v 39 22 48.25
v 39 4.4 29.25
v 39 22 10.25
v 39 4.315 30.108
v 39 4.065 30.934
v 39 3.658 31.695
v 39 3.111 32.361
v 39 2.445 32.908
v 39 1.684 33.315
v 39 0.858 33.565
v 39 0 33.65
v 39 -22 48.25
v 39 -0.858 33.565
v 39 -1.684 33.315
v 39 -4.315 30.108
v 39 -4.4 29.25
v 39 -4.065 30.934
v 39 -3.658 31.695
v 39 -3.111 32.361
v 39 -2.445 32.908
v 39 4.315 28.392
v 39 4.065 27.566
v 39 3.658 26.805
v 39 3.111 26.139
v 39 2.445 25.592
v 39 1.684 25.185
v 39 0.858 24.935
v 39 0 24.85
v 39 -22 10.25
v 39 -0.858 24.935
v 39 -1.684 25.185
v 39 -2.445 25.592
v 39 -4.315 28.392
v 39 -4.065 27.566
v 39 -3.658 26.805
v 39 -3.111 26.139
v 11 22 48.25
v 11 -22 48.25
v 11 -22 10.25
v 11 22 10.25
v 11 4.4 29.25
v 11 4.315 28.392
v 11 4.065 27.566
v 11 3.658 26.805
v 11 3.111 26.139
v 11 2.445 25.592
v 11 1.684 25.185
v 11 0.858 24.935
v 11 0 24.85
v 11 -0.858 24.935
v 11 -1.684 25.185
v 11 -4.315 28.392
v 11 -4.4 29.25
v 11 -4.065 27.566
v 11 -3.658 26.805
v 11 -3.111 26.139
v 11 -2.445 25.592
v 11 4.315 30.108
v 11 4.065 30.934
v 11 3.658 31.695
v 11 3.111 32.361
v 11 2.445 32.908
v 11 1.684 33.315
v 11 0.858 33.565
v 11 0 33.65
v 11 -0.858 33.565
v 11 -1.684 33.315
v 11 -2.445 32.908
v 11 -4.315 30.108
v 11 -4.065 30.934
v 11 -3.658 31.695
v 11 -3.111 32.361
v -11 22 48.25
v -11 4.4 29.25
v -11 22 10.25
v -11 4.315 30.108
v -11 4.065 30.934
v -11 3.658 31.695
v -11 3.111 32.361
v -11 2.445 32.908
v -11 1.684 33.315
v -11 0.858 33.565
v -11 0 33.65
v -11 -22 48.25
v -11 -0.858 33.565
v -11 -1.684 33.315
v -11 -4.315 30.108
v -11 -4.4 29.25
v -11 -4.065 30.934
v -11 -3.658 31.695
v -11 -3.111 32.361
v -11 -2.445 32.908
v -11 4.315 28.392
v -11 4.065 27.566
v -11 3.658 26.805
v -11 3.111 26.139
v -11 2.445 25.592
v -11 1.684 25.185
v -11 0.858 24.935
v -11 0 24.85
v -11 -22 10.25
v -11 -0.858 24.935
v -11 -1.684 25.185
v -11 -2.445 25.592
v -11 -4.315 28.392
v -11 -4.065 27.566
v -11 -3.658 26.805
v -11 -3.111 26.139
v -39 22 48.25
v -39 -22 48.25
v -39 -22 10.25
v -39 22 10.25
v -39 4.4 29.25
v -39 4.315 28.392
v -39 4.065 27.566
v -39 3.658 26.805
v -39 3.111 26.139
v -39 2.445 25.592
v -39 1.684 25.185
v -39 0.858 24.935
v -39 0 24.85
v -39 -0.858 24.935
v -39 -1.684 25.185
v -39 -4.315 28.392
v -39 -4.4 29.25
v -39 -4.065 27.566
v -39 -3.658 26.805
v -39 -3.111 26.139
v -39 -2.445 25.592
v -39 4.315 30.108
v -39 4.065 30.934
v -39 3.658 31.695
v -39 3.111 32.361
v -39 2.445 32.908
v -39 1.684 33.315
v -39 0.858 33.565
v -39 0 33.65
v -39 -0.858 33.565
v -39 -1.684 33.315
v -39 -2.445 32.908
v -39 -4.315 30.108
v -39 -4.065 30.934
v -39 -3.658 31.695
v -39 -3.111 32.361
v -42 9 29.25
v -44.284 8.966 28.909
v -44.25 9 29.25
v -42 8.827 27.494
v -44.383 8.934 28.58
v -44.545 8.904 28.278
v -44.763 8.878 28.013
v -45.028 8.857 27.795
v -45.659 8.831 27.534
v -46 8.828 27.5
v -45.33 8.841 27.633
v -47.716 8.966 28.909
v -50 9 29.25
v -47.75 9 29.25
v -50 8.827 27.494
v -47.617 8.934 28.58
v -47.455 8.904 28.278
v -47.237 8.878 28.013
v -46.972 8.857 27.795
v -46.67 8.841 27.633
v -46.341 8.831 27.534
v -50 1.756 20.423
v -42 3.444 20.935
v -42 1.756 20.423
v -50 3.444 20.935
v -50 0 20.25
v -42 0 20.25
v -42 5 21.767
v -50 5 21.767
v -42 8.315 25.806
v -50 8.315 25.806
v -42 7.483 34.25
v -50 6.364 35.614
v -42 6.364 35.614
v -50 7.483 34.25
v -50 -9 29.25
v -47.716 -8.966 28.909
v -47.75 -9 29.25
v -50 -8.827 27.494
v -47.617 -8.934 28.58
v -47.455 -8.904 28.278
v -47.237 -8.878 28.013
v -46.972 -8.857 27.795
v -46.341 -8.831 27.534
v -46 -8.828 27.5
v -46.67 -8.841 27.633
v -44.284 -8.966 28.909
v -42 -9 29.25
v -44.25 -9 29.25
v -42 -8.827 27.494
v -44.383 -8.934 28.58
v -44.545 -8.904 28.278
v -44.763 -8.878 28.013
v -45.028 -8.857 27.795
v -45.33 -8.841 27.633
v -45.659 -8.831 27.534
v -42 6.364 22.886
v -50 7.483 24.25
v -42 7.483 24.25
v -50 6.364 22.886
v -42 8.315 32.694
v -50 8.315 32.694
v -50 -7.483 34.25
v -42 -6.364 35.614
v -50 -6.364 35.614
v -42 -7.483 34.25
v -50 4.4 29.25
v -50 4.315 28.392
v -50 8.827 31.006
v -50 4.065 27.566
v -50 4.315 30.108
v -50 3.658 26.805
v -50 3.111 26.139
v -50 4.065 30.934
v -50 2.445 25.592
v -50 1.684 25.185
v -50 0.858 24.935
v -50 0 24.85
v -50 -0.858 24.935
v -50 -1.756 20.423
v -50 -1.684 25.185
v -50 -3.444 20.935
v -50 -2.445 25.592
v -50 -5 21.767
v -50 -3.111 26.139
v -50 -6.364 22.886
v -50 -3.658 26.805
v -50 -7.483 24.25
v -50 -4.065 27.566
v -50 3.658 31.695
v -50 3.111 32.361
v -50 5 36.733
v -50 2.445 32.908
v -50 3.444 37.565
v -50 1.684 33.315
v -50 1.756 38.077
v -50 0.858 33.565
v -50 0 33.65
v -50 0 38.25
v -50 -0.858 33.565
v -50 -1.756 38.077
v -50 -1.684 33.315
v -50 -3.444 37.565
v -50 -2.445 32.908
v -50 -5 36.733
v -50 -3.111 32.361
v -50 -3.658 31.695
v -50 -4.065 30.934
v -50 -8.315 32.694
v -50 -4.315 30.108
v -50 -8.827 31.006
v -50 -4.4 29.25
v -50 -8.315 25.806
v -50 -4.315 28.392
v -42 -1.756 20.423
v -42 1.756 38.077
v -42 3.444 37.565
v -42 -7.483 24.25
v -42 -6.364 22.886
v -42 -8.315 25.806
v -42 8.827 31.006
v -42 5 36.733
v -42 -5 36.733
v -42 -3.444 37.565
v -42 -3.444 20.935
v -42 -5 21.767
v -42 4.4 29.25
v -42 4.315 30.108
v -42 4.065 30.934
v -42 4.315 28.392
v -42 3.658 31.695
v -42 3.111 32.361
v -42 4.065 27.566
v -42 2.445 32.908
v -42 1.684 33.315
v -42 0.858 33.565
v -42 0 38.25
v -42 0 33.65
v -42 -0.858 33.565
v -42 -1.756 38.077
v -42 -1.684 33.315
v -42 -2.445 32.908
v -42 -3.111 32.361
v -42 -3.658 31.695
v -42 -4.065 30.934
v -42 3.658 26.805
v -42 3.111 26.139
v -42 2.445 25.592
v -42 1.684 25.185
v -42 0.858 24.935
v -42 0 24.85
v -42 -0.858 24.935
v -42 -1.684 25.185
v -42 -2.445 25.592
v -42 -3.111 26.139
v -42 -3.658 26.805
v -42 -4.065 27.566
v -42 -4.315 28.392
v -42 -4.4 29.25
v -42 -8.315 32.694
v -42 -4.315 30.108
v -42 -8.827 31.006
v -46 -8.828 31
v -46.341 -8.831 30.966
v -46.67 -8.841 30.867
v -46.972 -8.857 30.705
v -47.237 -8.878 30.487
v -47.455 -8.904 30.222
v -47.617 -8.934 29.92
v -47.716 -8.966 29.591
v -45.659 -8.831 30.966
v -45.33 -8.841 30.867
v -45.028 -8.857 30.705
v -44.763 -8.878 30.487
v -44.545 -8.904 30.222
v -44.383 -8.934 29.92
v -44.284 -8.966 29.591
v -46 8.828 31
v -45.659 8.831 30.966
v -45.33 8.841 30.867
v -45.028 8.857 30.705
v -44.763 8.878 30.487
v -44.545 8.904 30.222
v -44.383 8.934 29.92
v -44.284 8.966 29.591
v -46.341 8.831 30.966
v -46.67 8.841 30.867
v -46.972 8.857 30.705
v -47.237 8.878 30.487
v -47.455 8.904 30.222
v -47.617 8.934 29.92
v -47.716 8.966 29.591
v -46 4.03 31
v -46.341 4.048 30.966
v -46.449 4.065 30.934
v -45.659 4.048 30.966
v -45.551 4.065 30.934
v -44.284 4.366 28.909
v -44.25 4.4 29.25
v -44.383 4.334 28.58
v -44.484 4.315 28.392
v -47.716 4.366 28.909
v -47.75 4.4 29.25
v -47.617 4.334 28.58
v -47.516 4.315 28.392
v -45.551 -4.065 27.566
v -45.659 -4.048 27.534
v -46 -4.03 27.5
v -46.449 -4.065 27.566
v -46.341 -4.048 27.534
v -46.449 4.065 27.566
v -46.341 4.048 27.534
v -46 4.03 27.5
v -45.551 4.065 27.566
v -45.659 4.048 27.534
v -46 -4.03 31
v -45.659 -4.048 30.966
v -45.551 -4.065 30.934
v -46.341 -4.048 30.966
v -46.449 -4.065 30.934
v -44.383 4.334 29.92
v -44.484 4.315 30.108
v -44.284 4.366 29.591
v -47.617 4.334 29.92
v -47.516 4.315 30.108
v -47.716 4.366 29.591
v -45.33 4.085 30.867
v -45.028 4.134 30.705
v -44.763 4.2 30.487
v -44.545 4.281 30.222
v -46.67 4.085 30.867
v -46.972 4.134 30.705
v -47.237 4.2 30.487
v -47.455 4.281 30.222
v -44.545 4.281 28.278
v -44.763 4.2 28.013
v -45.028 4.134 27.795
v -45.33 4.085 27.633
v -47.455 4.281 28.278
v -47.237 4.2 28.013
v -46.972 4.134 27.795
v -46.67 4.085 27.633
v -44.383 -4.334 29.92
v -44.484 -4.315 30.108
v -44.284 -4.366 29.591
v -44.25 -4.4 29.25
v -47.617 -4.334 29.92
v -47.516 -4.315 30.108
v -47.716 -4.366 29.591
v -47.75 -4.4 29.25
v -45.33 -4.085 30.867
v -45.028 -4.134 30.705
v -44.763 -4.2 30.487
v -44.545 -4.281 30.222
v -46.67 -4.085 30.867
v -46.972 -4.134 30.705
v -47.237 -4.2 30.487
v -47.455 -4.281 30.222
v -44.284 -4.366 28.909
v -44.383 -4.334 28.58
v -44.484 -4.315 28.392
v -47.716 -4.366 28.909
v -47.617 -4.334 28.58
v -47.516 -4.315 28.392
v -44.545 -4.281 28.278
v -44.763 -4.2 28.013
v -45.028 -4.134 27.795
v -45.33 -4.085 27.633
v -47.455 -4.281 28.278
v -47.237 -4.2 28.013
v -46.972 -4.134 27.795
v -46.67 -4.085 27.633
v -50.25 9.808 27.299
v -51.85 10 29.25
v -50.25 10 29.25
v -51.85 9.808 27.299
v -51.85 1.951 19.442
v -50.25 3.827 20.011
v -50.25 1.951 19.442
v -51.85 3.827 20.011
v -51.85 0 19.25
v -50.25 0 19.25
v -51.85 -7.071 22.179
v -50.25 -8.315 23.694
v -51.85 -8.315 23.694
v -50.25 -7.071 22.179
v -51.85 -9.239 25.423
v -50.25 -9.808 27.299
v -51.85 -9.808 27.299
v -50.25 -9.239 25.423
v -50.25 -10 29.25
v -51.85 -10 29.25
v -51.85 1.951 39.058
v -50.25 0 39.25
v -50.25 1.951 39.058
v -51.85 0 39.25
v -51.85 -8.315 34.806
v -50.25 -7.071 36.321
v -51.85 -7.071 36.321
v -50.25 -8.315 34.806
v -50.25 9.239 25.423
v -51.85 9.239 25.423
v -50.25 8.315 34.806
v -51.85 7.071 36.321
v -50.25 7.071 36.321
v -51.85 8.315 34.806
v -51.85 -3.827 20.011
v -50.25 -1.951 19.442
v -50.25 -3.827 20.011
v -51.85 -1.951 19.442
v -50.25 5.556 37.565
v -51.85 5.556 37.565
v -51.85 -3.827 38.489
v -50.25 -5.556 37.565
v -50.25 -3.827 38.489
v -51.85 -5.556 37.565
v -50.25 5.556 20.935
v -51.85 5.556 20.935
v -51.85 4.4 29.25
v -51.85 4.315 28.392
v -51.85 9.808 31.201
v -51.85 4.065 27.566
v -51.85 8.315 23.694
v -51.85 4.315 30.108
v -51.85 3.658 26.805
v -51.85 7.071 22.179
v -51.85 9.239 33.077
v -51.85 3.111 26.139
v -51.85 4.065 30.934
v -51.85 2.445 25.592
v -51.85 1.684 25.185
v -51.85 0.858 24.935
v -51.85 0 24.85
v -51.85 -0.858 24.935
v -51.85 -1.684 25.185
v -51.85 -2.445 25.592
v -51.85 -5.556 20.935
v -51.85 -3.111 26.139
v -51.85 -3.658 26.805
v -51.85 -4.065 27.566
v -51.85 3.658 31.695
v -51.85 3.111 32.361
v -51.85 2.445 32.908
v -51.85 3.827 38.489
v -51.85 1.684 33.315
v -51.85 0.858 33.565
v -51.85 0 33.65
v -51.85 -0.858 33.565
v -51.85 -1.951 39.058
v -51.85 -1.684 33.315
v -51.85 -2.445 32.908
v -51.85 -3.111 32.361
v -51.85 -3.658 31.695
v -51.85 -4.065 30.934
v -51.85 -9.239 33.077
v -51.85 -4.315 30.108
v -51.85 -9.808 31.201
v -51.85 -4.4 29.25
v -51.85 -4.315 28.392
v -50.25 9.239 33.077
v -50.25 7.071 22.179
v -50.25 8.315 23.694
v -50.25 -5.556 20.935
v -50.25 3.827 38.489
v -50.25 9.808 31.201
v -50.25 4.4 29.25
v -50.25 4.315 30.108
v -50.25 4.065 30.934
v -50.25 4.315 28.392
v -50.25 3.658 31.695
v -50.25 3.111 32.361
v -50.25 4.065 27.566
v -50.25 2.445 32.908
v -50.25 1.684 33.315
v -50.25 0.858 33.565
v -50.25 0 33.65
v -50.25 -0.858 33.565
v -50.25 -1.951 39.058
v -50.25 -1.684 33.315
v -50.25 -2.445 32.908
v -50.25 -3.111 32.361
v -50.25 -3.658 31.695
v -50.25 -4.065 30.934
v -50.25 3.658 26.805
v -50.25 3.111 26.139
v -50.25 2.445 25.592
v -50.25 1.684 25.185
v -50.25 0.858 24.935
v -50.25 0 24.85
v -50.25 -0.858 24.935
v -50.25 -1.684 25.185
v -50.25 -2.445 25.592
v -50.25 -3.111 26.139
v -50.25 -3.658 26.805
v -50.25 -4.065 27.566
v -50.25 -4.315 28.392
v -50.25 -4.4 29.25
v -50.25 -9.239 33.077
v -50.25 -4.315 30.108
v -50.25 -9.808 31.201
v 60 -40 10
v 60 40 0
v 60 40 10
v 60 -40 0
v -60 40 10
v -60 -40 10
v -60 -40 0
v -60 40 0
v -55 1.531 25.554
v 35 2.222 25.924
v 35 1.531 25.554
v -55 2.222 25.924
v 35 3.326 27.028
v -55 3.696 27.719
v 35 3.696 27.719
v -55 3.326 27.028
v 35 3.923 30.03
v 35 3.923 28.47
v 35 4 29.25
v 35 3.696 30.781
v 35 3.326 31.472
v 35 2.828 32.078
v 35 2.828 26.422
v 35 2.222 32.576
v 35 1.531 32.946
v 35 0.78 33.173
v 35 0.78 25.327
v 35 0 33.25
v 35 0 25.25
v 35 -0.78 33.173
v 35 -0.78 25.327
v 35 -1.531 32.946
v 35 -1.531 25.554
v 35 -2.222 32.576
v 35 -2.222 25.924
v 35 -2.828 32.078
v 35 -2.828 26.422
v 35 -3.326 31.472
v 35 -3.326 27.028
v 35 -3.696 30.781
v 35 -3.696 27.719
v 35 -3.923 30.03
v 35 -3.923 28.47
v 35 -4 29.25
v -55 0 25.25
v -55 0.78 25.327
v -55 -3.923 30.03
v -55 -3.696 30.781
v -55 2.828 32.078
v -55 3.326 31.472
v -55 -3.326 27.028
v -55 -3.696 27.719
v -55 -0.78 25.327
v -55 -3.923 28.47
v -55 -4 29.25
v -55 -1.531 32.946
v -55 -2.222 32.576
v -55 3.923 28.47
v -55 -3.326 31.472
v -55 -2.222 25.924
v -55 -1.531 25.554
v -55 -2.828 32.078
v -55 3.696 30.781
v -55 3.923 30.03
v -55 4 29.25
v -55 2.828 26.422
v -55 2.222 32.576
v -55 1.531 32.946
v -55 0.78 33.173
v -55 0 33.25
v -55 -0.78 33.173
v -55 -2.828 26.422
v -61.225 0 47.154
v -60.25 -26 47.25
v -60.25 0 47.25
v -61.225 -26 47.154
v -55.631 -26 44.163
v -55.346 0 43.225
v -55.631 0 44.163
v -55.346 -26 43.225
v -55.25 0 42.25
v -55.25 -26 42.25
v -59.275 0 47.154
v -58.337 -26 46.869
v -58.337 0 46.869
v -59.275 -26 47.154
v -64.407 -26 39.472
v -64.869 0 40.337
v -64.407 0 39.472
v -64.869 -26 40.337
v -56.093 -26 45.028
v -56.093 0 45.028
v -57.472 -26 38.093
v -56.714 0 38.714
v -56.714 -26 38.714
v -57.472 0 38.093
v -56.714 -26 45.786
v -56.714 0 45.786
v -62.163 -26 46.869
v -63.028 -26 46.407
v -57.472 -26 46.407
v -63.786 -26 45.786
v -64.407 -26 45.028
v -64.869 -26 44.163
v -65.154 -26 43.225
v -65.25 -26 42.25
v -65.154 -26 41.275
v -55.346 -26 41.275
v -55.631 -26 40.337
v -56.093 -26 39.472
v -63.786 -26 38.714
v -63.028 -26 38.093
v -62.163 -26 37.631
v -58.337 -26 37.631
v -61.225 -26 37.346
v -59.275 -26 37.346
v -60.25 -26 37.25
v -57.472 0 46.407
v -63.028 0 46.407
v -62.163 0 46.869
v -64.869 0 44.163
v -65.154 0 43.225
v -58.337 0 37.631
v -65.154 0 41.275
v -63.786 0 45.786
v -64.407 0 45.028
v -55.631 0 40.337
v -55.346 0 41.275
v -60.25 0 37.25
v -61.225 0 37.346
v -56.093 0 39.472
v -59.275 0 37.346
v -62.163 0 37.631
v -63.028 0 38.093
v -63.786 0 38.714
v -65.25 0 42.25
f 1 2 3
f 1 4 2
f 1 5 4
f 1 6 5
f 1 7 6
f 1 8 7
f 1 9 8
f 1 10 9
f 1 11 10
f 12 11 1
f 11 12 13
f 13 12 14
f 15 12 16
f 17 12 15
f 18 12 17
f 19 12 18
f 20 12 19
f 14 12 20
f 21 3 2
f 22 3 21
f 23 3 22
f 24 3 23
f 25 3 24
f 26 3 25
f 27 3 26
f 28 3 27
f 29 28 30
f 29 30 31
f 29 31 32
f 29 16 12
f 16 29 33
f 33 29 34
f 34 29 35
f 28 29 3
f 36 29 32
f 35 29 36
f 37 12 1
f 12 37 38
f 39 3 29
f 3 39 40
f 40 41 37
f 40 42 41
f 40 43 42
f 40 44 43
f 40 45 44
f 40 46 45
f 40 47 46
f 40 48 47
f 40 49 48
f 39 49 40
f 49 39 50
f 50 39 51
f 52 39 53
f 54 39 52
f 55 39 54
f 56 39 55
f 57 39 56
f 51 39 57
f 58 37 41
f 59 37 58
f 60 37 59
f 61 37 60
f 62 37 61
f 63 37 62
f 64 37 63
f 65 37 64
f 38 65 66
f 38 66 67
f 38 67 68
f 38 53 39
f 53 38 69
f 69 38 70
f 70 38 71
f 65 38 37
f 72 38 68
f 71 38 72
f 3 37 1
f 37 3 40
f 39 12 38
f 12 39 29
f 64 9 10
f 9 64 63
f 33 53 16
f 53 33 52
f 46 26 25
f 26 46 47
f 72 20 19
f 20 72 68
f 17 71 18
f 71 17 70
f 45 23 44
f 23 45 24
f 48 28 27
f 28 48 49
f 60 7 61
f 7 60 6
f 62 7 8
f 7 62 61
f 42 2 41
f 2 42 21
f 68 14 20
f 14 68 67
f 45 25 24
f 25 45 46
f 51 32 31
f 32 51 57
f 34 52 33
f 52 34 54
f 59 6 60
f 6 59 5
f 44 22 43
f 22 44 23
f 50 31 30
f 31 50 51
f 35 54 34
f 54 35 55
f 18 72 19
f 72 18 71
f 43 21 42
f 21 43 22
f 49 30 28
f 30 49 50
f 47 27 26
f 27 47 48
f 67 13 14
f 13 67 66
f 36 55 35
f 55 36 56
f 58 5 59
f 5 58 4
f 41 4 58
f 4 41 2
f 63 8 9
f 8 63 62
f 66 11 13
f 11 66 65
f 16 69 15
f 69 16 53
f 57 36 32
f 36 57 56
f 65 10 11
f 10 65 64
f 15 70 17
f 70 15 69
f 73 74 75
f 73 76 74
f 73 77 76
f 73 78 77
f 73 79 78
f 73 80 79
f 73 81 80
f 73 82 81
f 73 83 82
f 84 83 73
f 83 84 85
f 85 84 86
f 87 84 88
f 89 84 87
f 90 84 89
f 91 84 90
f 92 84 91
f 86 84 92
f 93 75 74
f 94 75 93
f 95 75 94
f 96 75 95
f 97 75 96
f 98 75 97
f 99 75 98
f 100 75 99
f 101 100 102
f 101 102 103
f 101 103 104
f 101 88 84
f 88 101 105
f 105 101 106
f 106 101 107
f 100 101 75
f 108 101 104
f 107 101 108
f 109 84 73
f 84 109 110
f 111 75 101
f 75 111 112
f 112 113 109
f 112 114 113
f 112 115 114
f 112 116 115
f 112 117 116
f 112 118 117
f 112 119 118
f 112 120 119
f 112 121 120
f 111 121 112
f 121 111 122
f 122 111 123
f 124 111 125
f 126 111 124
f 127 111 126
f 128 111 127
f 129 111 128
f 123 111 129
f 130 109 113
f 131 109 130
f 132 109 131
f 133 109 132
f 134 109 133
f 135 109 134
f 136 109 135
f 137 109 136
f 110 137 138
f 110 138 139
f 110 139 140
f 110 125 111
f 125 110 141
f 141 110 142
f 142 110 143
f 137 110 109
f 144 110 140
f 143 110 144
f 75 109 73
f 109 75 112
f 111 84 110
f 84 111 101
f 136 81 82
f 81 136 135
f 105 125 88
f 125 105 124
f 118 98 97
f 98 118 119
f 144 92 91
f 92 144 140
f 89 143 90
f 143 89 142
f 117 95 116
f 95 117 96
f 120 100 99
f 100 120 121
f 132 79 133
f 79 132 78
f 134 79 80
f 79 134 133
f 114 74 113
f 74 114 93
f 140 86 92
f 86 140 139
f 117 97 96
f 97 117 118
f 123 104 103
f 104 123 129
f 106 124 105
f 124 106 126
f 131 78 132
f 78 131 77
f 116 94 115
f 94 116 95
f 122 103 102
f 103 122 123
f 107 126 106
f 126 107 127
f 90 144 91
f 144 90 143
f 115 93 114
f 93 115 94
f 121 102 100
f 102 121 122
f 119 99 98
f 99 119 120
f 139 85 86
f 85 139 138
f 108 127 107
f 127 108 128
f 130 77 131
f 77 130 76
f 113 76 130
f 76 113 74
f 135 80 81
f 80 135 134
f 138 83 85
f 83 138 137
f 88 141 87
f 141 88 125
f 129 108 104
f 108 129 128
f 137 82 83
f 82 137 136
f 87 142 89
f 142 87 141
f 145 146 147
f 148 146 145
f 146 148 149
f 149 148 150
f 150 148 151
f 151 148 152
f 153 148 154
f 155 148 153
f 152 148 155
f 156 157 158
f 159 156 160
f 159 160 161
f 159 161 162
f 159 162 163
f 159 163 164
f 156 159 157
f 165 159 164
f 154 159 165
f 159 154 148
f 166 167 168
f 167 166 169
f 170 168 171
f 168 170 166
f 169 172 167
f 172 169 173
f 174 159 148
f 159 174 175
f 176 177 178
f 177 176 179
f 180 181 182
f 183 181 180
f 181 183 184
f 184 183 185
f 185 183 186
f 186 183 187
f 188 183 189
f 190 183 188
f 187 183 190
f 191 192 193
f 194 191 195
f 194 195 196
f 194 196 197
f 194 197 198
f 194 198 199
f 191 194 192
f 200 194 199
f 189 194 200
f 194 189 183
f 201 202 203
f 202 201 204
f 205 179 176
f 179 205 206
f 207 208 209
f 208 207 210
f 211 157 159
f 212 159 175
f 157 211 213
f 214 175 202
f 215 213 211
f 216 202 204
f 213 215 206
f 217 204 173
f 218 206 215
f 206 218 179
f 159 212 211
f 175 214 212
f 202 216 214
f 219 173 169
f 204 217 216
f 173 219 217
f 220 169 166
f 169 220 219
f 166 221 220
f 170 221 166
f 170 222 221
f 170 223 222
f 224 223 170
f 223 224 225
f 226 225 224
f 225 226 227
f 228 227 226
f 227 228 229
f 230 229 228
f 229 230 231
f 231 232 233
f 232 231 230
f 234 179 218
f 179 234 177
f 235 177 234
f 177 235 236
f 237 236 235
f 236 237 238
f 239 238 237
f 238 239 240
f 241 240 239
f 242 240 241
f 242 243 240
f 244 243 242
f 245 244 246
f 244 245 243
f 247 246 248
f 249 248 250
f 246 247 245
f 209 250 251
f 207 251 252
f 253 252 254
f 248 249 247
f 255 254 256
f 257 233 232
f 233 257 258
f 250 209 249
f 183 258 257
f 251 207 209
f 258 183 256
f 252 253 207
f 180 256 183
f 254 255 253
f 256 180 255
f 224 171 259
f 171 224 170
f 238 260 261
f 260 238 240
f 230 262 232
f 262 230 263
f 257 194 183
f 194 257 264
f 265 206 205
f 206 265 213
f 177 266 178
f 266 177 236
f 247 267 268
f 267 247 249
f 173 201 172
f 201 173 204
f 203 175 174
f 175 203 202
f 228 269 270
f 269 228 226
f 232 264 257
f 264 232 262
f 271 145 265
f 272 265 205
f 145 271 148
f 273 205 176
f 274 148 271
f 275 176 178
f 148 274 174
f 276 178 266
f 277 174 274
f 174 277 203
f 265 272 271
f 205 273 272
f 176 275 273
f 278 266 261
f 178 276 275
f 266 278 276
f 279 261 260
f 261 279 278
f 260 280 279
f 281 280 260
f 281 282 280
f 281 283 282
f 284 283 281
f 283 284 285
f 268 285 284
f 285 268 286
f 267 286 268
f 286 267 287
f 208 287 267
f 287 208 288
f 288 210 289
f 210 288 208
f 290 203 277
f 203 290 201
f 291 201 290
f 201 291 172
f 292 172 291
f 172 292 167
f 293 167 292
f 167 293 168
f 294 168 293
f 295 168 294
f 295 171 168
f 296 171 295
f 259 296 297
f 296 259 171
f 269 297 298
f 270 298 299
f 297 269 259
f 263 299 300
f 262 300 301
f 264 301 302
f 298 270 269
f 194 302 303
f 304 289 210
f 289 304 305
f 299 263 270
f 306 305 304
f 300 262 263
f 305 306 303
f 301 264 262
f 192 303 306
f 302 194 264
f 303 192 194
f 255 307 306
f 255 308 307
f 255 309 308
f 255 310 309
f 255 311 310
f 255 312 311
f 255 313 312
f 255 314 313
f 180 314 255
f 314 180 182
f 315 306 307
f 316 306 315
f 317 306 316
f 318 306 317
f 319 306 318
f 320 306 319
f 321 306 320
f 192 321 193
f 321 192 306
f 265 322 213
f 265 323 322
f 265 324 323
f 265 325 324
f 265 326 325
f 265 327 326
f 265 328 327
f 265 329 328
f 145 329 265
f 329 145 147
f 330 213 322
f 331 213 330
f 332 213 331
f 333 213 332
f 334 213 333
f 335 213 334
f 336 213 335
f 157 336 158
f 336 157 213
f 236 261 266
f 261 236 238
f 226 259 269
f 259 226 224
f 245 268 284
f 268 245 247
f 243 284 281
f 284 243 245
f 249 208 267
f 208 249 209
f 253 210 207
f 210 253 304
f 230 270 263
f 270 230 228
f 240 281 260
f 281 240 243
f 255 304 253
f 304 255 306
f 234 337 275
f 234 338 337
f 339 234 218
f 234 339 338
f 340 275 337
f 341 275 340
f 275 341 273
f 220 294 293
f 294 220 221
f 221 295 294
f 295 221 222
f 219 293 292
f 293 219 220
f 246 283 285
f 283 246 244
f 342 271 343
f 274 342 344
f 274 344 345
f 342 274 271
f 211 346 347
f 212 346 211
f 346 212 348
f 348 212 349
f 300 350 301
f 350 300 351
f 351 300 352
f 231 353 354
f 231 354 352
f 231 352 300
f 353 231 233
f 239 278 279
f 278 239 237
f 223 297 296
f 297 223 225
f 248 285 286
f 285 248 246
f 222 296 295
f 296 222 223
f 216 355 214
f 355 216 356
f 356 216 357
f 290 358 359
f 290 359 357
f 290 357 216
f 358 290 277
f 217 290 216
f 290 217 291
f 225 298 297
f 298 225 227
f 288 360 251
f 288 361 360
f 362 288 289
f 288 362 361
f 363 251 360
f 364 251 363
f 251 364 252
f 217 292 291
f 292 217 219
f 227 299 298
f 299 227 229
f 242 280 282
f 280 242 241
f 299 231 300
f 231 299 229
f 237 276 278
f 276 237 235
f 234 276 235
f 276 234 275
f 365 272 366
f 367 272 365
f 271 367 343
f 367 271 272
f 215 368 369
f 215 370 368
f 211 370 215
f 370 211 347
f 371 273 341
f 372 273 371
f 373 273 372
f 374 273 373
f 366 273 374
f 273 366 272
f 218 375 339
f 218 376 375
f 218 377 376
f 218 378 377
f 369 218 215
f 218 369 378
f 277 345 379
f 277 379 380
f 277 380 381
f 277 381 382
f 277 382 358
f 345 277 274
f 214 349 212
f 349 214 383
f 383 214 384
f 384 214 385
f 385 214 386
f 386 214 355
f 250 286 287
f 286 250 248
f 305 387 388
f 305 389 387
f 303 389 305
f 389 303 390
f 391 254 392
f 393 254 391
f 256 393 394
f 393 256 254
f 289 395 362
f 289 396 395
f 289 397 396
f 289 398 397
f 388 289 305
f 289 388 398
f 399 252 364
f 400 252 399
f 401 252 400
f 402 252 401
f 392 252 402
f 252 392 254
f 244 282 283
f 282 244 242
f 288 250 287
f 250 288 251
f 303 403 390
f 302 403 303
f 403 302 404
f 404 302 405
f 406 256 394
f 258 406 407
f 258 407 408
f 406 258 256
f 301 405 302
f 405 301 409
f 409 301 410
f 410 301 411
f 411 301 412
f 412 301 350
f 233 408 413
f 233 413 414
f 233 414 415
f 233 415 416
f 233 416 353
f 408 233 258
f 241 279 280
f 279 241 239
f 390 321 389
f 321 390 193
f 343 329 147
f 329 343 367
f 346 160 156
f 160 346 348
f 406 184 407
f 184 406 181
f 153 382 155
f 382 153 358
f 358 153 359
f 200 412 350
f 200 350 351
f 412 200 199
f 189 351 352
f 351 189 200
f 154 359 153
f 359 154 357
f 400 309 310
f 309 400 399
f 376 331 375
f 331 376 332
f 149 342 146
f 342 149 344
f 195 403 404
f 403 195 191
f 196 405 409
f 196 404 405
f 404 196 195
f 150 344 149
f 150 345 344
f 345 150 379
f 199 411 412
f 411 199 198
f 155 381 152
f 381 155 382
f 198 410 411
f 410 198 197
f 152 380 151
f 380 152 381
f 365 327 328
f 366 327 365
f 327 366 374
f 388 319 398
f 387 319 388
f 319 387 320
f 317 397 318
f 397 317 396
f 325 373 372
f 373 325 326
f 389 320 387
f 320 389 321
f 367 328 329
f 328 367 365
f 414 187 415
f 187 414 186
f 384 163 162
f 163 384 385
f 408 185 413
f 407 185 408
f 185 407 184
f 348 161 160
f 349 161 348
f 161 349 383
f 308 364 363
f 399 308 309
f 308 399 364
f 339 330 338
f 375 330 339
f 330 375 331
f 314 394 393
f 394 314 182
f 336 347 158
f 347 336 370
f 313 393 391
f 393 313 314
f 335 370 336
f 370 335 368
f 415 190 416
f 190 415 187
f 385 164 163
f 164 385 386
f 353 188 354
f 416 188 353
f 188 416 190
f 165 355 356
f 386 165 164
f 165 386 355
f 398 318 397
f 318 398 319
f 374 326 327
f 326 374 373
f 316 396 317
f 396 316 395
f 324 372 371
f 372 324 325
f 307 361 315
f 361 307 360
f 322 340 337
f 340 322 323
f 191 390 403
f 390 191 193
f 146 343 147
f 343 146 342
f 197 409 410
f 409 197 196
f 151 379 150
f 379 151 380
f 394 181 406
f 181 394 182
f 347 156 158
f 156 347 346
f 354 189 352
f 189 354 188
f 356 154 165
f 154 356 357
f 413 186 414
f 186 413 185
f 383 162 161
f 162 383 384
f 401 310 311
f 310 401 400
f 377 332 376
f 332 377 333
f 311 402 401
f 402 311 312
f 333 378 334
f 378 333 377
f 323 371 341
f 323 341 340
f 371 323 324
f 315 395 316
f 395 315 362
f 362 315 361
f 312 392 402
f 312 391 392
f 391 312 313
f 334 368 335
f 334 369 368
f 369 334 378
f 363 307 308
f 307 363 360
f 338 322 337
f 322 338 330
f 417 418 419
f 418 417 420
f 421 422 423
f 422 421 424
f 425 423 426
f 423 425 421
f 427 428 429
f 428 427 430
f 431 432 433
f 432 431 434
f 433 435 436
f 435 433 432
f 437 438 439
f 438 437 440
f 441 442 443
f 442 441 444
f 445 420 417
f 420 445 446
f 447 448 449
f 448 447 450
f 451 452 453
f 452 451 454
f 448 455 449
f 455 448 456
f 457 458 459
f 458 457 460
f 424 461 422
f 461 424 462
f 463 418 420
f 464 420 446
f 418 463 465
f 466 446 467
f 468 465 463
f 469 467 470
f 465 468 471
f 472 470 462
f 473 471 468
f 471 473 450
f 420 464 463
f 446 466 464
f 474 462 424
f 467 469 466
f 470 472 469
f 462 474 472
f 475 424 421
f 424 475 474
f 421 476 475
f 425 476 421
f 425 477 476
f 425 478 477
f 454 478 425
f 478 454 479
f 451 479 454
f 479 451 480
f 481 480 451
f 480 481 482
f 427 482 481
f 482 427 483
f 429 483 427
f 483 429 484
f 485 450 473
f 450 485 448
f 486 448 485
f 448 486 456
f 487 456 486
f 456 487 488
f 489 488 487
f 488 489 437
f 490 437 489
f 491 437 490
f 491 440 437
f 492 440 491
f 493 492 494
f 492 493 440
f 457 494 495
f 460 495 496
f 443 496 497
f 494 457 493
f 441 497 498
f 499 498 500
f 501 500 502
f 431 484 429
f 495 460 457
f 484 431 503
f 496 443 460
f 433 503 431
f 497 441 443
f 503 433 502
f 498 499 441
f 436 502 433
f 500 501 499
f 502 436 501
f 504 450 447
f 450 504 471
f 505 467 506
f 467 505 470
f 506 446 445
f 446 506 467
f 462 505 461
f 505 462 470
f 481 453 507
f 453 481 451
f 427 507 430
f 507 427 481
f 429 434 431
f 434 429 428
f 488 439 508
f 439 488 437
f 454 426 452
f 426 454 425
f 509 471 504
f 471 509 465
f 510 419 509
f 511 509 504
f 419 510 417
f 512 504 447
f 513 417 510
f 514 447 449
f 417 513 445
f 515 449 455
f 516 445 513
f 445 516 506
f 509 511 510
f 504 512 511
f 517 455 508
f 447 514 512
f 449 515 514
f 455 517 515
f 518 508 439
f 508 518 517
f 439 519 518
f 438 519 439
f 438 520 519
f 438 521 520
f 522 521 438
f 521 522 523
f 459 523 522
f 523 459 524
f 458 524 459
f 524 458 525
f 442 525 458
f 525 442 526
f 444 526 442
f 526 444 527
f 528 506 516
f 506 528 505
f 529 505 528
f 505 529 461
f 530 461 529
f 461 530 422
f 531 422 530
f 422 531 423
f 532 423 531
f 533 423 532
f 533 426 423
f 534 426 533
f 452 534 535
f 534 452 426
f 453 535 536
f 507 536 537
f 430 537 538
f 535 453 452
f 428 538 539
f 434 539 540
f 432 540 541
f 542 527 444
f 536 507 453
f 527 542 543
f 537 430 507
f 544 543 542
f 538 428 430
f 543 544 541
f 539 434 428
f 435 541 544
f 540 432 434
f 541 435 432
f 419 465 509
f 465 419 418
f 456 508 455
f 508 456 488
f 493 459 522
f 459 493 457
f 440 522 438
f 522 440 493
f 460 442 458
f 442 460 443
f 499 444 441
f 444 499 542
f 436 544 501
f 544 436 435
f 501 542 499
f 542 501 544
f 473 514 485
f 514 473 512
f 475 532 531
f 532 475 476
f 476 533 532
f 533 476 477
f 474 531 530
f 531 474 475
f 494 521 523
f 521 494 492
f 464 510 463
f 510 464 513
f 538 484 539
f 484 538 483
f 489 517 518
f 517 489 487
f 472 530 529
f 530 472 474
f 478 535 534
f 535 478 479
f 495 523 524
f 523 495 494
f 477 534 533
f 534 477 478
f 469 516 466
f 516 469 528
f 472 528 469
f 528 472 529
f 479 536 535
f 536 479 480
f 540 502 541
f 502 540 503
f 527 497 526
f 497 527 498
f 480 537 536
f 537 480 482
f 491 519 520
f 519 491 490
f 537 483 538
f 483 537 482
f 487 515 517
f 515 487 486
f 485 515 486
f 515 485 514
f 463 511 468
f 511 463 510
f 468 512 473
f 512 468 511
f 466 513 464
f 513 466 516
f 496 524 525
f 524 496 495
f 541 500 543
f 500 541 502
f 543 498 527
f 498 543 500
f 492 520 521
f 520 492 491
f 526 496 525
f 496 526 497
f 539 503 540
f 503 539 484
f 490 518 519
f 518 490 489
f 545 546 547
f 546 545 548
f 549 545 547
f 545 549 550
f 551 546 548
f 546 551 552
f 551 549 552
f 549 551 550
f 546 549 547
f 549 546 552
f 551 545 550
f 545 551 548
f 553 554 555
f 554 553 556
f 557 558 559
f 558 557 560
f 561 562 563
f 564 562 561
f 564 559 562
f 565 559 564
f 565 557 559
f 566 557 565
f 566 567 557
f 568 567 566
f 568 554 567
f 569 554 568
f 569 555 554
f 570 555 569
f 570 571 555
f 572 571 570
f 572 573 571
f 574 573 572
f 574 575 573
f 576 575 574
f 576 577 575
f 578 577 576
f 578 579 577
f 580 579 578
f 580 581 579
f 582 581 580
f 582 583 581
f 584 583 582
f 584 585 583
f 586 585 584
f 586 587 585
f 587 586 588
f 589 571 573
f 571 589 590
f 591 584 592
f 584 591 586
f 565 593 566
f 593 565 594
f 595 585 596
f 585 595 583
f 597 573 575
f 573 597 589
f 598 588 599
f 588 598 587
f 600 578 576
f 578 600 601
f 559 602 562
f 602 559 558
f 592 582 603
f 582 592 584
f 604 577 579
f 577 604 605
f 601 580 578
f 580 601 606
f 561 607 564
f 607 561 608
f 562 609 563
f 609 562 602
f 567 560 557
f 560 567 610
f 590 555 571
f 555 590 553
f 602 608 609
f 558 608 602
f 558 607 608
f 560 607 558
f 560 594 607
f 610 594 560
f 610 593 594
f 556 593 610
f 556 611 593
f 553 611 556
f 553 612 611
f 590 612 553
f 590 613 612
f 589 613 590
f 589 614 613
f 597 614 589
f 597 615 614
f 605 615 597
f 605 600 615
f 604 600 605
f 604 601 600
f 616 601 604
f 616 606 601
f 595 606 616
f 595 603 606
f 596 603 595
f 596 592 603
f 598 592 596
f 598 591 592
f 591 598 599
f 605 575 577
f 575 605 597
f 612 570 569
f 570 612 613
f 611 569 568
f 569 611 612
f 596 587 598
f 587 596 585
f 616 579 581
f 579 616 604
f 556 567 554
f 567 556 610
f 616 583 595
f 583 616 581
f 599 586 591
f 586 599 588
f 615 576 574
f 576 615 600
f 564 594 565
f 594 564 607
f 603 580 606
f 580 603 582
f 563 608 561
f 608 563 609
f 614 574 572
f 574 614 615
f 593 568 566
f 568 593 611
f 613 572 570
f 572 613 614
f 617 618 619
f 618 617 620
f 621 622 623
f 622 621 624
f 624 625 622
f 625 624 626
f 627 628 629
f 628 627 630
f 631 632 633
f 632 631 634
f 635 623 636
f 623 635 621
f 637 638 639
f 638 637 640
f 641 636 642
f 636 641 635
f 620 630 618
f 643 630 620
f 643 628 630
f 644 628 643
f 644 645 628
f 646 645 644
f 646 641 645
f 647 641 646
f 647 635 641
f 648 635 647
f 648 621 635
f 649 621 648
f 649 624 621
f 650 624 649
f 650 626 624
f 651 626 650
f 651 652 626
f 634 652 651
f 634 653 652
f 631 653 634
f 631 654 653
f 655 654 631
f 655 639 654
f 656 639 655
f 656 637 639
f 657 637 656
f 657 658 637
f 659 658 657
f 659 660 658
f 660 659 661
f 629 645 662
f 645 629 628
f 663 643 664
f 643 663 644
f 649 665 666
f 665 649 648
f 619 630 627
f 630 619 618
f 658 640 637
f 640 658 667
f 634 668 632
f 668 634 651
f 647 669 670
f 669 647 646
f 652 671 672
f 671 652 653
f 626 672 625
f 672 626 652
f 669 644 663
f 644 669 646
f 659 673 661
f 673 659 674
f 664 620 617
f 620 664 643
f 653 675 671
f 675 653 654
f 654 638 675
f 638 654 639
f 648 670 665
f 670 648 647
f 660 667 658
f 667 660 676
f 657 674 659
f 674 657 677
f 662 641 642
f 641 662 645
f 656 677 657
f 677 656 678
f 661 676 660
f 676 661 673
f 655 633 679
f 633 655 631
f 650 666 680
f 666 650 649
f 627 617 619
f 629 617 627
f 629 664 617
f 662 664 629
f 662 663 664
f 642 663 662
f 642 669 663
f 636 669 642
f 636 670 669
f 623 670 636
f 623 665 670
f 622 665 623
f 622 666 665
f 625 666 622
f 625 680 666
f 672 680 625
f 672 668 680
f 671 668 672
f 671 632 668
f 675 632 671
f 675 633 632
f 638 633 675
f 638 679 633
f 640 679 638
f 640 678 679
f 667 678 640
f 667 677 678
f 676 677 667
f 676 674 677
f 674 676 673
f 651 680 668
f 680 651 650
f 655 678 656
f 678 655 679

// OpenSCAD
$fn = 32;

// ------------------------------------------------------------------------
// Machine vise: screw d8, jaws 28 x 38 mm
// Every part is its own module, assembly() places every instance.
// ------------------------------------------------------------------------

// --- part 1 ---
module vise_bed() {
  difference() {
    translate([-60, -40, 0]) cube([120, 80, 10]);
  }
}

// --- part 2 ---
module vise_jaw() {
  difference() {
    translate([-14, -22, 0]) cube([28, 44, 38]);
    translate([0, 0, 19]) rotate([0, 90, 0]) cylinder(h = 30, d = 8.8, center = true);
  }
}

// --- part 3 ---
module vise_screw() {
  translate([0, 0, -45]) cylinder(h = 90, d = 8);
}

// --- part 4 ---
module screw_collar() {
  difference() {
    cylinder(h = 8, d = 18);
    translate([0, 0, -1]) cylinder(h = 10, d = 8.8);
    translate([0, 0, 4]) rotate([90, 0, 0]) cylinder(h = 20, d = 3.5, center = true);
  }
}

// --- part 5 ---
module screw_washer() {
  difference() {
      translate([0, 0, 0]) cylinder(h = 1.6, d = 20);
      translate([0, 0, -1]) cylinder(h = 3.6, d = 8.8);
    }
}

// --- part 6 ---
module vise_handle() {
  cylinder(h = 26, d = 10);
}

// --- assembly ---
module assembly() {
  color([0.80, 0.24, 0.20]) translate([0, 0, 0]) rotate([0, 0, 0]) vise_bed();
  color([0.20, 0.45, 0.75]) translate([25, 0, 10.25]) rotate([0, 0, 0]) vise_jaw();
  color([0.25, 0.62, 0.32]) translate([-25, 0, 10.25]) rotate([0, 0, 0]) vise_jaw();
  color([0.92, 0.70, 0.18]) translate([-10, 0, 29.25]) rotate([0, 90, 0]) vise_screw();
  color([0.58, 0.35, 0.70]) translate([-50, 0, 29.25]) rotate([0, 90, 0]) screw_collar();
  color([0.16, 0.66, 0.66]) translate([-51.85, 0, 29.25]) rotate([0, 90, 0]) screw_washer();
  color([0.85, 0.48, 0.18]) translate([-60.25, 0, 42.25]) rotate([90, 0, 0]) vise_handle();
}

assembly();
